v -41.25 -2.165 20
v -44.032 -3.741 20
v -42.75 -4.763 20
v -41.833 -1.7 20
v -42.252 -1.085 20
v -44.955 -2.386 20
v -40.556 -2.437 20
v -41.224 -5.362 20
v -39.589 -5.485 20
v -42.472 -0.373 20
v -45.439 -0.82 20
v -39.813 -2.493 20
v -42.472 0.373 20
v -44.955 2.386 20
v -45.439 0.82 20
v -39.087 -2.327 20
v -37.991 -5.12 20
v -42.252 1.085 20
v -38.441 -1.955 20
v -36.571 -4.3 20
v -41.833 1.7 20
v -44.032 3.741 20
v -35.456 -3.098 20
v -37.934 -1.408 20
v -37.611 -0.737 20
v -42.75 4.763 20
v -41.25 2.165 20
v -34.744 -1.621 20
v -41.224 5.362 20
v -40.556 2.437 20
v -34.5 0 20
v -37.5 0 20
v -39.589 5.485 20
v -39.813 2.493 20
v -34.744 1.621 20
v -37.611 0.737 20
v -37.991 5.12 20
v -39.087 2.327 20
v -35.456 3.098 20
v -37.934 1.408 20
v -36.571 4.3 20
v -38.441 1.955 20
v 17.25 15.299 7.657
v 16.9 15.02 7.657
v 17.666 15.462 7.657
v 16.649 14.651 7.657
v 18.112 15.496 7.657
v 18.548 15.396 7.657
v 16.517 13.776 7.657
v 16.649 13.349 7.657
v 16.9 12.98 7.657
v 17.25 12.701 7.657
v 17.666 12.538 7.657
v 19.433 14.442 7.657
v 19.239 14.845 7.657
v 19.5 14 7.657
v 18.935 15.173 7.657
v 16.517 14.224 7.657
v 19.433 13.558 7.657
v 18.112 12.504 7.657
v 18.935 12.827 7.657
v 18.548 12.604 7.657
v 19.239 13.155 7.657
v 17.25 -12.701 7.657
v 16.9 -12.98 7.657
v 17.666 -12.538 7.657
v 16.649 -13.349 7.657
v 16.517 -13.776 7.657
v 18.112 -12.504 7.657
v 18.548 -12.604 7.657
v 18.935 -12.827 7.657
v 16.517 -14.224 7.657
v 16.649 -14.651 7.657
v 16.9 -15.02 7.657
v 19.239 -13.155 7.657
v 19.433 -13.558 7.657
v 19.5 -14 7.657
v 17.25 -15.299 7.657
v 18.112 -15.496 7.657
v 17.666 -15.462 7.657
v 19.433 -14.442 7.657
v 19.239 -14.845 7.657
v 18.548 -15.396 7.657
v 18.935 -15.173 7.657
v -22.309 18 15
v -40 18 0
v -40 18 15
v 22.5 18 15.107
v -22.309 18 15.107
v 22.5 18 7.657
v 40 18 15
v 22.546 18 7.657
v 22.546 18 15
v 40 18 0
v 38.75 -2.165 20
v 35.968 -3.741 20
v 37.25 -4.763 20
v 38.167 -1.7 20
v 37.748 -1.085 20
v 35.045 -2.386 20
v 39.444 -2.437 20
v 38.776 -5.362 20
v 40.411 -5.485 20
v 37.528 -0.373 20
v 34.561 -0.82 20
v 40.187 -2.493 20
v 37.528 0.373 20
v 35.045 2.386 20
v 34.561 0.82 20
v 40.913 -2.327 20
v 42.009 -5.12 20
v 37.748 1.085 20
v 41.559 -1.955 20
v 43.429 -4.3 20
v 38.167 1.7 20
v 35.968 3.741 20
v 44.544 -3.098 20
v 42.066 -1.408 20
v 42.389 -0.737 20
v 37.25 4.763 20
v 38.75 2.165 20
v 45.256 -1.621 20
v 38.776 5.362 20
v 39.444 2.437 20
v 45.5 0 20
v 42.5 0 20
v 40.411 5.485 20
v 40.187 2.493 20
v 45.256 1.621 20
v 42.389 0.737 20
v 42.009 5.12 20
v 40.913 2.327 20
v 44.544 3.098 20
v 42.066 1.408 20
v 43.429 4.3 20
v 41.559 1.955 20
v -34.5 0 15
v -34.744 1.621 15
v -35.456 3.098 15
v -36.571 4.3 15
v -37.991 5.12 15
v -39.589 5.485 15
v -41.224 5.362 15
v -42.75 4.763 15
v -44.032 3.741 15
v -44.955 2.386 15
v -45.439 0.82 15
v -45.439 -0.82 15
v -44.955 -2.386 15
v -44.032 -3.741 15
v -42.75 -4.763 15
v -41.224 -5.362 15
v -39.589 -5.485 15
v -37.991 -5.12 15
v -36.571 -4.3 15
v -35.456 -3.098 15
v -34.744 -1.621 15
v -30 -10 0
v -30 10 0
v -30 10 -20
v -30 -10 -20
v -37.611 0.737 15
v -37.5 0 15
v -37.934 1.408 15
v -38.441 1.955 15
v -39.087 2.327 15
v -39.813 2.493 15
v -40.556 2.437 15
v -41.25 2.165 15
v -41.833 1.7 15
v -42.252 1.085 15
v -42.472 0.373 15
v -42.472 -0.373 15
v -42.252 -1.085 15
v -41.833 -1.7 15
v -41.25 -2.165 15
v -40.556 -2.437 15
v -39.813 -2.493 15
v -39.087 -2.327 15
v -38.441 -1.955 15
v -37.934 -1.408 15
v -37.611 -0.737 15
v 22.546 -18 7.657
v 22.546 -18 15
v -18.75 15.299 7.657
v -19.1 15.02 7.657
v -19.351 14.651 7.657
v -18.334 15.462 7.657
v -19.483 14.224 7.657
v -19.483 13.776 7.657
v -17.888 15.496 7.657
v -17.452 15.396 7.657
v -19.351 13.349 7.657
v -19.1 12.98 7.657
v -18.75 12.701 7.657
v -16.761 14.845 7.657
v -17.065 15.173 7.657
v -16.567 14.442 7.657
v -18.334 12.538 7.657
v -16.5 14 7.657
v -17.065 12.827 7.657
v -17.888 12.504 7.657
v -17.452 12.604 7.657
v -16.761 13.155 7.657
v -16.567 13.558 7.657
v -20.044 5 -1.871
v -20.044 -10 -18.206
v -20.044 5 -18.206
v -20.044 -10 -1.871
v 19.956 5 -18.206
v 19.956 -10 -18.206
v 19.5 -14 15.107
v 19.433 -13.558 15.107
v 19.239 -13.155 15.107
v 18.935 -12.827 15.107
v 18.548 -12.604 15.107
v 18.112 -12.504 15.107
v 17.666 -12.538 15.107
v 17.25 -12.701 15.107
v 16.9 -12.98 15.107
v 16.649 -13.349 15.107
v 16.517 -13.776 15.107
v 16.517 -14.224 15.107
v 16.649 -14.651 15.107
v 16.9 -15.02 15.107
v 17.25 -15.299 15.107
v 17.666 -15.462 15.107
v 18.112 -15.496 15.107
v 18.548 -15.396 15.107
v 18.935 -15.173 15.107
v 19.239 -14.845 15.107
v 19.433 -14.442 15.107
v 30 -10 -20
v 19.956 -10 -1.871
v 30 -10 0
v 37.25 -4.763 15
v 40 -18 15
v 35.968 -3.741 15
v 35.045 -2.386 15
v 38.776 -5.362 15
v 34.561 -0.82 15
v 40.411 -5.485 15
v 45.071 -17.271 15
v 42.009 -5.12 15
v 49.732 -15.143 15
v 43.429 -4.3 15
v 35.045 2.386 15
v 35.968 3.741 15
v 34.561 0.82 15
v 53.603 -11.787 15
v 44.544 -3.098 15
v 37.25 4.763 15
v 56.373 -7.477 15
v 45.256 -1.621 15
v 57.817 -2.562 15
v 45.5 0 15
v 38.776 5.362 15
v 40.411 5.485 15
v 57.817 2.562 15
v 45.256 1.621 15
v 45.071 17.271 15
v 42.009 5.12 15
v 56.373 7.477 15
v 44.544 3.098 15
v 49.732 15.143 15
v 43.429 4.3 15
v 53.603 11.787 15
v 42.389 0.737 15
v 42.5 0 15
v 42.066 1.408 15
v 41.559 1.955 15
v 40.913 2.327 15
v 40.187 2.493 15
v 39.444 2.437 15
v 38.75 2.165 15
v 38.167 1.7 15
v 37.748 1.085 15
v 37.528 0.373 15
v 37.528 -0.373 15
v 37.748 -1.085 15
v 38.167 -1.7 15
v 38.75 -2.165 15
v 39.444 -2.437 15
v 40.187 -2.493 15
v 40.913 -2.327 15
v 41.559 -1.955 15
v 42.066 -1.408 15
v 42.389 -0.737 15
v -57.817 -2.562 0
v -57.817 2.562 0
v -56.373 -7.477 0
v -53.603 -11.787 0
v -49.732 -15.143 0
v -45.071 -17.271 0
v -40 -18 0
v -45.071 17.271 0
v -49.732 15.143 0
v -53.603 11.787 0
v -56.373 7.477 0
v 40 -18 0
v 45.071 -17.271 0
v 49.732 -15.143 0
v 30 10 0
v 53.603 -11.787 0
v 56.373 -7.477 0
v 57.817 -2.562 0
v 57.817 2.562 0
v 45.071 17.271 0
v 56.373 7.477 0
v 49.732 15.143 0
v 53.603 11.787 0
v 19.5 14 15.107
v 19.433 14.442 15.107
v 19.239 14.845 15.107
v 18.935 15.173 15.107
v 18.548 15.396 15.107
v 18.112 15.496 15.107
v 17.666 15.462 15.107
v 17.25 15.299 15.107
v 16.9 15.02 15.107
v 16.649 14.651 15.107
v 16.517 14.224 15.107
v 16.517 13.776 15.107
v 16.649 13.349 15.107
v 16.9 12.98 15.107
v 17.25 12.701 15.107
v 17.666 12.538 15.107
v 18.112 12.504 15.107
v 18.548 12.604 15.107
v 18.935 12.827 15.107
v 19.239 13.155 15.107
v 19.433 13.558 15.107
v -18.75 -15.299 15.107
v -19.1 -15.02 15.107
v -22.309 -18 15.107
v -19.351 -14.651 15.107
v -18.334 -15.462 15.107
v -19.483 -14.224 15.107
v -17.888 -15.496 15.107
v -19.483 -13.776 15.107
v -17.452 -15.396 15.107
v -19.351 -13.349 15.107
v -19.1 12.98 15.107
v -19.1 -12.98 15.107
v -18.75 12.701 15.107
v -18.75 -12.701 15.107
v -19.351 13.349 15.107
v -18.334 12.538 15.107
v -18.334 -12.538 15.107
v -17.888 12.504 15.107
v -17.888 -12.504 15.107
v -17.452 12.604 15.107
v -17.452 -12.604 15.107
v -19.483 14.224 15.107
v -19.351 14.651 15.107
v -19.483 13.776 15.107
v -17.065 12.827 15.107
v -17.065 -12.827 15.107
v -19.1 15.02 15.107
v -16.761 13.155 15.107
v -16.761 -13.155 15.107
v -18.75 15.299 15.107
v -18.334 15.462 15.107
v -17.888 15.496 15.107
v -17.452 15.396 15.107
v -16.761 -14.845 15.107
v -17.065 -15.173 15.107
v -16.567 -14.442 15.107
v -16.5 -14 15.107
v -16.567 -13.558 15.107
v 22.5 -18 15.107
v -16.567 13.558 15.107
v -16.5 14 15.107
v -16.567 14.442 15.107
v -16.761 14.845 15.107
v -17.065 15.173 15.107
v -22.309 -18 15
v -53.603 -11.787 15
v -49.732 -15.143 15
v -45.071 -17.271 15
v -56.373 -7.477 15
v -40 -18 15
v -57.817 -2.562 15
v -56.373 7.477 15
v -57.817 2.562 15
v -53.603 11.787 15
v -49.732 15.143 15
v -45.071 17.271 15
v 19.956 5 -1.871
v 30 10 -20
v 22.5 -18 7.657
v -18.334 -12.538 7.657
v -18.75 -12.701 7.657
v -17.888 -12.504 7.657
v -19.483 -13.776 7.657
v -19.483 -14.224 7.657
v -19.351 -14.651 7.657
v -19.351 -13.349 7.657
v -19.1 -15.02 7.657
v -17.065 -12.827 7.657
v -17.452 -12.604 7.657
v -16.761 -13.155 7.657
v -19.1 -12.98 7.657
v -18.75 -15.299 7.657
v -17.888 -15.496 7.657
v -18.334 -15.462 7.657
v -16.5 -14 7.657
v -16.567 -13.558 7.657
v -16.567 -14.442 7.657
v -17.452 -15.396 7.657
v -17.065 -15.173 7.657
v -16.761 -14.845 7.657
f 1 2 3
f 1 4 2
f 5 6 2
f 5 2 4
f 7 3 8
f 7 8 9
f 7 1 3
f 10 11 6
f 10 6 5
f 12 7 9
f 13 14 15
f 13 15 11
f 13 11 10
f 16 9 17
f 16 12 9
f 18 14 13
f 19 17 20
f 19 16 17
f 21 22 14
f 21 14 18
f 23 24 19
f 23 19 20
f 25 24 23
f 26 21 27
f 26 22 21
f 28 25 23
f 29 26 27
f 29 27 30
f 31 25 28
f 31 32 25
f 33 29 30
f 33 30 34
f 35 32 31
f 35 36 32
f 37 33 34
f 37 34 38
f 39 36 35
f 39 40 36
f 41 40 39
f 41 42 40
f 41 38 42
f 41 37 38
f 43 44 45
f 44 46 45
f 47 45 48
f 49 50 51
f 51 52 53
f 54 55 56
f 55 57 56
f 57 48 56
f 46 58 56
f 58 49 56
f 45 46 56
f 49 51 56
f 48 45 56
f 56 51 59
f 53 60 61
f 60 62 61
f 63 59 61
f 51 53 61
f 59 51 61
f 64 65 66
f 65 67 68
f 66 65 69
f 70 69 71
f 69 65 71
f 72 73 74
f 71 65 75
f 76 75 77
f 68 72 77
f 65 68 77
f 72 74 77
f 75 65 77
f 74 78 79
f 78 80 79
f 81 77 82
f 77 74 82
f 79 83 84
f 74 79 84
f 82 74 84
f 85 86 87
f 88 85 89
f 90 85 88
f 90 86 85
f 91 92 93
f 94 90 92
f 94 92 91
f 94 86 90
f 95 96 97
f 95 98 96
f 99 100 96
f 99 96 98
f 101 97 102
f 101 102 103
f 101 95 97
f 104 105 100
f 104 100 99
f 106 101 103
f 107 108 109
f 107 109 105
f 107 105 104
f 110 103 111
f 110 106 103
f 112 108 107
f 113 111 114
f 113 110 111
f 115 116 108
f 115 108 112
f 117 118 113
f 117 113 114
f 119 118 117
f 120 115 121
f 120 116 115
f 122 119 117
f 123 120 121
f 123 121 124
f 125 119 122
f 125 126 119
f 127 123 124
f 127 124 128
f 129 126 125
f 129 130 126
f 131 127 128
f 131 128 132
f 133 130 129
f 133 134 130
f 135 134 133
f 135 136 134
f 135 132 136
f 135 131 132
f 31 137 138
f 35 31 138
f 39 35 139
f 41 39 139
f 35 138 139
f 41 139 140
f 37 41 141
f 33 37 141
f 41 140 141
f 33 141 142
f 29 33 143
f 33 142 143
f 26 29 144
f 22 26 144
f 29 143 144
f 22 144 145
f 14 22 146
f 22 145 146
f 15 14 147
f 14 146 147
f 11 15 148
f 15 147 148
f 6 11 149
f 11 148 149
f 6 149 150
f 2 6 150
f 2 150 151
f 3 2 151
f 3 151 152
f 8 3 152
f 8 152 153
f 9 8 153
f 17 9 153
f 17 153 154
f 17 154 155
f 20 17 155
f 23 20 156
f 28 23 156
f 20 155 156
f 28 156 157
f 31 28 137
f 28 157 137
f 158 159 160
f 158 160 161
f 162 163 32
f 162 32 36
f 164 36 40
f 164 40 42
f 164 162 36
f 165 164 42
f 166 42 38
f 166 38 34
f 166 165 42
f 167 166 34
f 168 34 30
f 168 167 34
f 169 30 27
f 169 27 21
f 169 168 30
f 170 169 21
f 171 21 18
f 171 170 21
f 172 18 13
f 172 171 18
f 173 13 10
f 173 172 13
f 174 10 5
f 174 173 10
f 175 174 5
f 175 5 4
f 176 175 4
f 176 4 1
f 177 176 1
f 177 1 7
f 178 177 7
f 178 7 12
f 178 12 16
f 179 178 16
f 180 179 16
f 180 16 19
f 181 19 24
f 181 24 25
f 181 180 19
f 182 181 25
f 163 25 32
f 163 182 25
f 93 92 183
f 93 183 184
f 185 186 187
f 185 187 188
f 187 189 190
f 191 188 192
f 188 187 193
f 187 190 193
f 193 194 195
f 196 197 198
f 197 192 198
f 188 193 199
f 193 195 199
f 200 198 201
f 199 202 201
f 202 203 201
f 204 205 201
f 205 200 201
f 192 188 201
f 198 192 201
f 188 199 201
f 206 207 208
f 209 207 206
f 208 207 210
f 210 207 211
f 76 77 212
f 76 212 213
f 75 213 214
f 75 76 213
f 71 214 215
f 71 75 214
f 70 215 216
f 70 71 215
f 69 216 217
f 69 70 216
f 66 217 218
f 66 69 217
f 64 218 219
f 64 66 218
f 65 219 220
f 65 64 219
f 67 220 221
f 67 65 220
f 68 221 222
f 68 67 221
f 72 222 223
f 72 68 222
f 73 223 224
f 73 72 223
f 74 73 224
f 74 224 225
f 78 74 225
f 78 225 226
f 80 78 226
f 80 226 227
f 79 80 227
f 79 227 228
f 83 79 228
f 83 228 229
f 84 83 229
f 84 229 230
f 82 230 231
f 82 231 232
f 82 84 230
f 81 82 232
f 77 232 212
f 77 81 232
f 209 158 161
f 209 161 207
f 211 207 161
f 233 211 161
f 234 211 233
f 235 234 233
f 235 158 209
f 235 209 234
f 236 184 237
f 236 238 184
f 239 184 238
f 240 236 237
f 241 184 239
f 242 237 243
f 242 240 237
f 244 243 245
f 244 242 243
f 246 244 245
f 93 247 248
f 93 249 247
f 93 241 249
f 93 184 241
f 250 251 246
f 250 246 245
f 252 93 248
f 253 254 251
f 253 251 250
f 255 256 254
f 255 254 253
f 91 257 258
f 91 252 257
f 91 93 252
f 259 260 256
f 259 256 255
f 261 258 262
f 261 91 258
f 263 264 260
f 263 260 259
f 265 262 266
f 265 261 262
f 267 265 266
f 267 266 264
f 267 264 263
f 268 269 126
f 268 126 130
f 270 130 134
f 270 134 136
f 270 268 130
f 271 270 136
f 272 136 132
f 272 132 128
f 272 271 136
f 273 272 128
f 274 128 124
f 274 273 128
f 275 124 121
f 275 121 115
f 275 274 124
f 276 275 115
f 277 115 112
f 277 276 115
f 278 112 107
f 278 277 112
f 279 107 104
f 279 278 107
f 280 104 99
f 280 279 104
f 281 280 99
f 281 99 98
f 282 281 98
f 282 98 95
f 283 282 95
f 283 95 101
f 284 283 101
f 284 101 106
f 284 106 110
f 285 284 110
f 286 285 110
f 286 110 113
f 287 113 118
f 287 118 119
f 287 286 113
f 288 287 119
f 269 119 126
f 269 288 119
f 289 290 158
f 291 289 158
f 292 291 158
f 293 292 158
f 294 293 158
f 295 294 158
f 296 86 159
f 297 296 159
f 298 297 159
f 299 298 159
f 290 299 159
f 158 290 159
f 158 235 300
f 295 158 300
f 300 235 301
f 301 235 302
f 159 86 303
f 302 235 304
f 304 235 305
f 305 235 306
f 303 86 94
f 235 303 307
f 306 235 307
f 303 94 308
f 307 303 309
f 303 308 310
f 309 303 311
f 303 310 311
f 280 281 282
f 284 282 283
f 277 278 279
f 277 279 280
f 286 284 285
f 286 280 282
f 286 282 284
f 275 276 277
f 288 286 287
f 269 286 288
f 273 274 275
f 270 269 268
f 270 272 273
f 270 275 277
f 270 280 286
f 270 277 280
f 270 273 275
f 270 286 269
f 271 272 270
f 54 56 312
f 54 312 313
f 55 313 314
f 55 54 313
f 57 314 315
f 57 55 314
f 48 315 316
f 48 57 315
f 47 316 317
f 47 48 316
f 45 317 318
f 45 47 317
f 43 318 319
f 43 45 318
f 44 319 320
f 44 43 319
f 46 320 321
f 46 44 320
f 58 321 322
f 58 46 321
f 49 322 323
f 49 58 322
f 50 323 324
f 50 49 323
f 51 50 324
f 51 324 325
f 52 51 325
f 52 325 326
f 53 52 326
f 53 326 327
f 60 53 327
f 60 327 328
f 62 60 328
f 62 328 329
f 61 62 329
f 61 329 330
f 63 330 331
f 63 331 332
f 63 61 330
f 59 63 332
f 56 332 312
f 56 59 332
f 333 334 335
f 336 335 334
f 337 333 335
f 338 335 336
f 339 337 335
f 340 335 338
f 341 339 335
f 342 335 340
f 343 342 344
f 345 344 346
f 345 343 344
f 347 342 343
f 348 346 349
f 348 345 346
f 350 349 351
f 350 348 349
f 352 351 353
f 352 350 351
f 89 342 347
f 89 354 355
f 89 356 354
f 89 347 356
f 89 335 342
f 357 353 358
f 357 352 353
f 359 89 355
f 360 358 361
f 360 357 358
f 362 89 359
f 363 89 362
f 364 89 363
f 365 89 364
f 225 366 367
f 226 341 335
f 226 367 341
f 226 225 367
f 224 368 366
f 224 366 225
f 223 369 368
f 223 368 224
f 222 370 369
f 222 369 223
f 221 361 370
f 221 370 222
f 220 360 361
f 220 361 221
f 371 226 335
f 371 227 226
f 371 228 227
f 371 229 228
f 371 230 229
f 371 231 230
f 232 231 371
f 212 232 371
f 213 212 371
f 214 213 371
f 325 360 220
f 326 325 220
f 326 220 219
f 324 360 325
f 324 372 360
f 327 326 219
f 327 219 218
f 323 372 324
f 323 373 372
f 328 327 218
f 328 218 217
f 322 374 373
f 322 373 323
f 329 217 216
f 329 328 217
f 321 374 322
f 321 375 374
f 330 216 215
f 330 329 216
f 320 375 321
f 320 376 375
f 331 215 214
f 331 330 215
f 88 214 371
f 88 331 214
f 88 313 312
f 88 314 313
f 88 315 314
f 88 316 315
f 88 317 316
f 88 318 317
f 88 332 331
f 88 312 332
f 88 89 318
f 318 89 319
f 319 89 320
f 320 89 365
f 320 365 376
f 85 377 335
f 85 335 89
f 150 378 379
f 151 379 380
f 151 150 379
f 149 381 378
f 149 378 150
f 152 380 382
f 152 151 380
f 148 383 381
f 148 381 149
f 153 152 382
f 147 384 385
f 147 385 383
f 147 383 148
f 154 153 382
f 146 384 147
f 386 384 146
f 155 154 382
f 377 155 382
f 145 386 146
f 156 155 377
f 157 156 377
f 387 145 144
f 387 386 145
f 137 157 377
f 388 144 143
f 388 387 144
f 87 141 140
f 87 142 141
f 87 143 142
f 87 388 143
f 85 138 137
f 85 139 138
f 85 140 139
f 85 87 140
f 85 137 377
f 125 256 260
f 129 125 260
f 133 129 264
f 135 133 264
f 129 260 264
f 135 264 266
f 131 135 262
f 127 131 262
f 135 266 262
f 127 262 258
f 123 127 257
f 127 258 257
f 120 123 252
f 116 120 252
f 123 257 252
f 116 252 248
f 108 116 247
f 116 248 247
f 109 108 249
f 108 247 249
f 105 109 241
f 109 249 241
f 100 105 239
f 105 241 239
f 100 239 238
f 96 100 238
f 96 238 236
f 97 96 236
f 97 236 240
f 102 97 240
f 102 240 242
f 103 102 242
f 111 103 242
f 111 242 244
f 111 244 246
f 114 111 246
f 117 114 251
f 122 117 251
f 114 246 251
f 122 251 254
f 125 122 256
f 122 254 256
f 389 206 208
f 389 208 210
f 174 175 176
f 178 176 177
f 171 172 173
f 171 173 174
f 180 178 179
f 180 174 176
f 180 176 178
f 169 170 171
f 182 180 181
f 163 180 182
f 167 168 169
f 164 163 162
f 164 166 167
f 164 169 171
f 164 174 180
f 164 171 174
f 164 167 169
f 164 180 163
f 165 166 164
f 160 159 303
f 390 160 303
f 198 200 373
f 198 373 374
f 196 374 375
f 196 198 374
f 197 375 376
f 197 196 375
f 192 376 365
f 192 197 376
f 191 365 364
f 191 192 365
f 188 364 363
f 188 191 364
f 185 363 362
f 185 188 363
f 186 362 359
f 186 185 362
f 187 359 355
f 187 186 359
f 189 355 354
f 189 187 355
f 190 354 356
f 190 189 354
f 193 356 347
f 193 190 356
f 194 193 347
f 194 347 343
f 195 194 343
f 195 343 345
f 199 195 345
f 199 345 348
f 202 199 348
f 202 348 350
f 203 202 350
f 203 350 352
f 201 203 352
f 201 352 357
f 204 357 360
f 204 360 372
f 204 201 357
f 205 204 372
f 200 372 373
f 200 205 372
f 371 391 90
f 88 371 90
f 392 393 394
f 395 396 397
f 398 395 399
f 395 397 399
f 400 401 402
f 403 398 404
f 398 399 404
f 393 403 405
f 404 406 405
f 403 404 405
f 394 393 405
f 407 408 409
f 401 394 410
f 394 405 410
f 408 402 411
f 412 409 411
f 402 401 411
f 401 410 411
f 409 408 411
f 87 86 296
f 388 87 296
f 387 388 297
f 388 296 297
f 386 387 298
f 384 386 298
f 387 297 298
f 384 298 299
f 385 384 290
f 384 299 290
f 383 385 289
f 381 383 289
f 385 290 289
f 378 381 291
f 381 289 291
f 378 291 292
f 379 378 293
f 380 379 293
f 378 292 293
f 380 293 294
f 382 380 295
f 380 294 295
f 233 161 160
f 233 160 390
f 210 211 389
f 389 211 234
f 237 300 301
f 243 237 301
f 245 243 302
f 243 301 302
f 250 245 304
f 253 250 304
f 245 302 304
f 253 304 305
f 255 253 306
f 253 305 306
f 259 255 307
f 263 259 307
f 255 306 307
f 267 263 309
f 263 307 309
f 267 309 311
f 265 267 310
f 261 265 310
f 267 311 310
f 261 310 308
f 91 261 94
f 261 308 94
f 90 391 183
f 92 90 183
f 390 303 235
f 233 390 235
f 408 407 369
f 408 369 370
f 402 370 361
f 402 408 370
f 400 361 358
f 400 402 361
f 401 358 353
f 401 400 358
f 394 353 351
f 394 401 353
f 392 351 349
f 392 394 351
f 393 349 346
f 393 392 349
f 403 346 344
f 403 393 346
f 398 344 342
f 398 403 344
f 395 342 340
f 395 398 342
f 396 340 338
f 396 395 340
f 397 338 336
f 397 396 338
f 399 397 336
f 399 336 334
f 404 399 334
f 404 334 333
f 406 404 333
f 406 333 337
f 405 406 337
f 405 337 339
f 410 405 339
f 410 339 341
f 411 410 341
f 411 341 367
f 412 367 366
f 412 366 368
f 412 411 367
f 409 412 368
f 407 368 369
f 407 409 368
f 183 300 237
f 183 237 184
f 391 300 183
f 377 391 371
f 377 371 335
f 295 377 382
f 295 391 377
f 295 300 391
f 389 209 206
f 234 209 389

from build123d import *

# Parameters (mm, degrees)
PAD_DEPTH       = 15
SKETCH002_W     = 44.8548
SKETCH002_H     = 24.142434
POCKET_DEPTH    = 36
SKETCH003_W     = 44.808823
SKETCH003_H     = 36
SKETCH003_R     = 1.5
PAD001_DEPTH    = 7.45
SKETCH004_R     = 5.5
SKETCH004_R_2   = 2.5
PAD002_DEPTH    = 5
SKETCH005_W     = 60
SKETCH005_H     = 20
PAD003_DEPTH    = 20
SKETCH006_W     = 40
SKETCH006_H     = 16.335257
POCKET001_DEPTH = 15


with BuildPart() as part:
    # Sketch001 → Pad (new body)
    with BuildSketch(Plane.XY):
        with BuildLine():
            ThreePointArc((-40, 18), (-58, 0), (-40, -18))
            Line((40, -18), (-40, -18))
            ThreePointArc((40, -18), (58, 0), (40, 18))
            Line((-40, 18), (40, 18))
        make_face()
    extrude(amount=PAD_DEPTH)

    # Sketch002 (on DatumPlane) → Pocket (cut)
    with BuildSketch(Plane.XZ.offset(18)):
        with Locations((0.118577, 19.728132)):
            Rectangle(SKETCH002_W, SKETCH002_H)
    extrude(amount=-POCKET_DEPTH, mode=Mode.SUBTRACT)

    # Sketch003 (on Face9 of Pocket) → Pad001 (join)
    with BuildSketch(Plane.XY.offset(7.656915)):
        with Locations((0.095588, 0)):
            Rectangle(SKETCH003_W, SKETCH003_H)
        with Locations((-18, 14)):
            Circle(SKETCH003_R, mode=Mode.SUBTRACT)
        with Locations((18, 14)):
            Circle(SKETCH003_R, mode=Mode.SUBTRACT)
        with Locations((18, -14)):
            Circle(SKETCH003_R, mode=Mode.SUBTRACT)
        with Locations((-18, -14)):
            Circle(SKETCH003_R, mode=Mode.SUBTRACT)
    extrude(amount=PAD001_DEPTH)

    # Sketch004 (on Face5 of Pad001) → Pad002 (join)
    with BuildSketch(Plane.XY.offset(15)):
        with Locations((-40, 0)):
            Circle(SKETCH004_R)
        with Locations((-40, 0)):
            Circle(SKETCH004_R_2, mode=Mode.SUBTRACT)
        with Locations((40, 0)):
            Circle(SKETCH004_R)
        with Locations((40, 0)):
            Circle(SKETCH004_R_2, mode=Mode.SUBTRACT)
    extrude(amount=PAD002_DEPTH)

    # Sketch005 (on Face4 of Pad002) → Pad003 (join)
    with BuildSketch(Plane(origin=(0, 0, 0), x_dir=(1, 0, 0), z_dir=(0, 0, -1))):
        Rectangle(SKETCH005_W, SKETCH005_H)
    extrude(amount=PAD003_DEPTH)

    # Sketch006 (on Face12 of Pad003) → Pocket001 (cut)
    with BuildSketch(Plane.XZ.offset(10)):
        with Locations((-0.04431, -10.038293)):
            Rectangle(SKETCH006_W, SKETCH006_H)
    extrude(amount=-POCKET001_DEPTH, mode=Mode.SUBTRACT)


solid = part.part
